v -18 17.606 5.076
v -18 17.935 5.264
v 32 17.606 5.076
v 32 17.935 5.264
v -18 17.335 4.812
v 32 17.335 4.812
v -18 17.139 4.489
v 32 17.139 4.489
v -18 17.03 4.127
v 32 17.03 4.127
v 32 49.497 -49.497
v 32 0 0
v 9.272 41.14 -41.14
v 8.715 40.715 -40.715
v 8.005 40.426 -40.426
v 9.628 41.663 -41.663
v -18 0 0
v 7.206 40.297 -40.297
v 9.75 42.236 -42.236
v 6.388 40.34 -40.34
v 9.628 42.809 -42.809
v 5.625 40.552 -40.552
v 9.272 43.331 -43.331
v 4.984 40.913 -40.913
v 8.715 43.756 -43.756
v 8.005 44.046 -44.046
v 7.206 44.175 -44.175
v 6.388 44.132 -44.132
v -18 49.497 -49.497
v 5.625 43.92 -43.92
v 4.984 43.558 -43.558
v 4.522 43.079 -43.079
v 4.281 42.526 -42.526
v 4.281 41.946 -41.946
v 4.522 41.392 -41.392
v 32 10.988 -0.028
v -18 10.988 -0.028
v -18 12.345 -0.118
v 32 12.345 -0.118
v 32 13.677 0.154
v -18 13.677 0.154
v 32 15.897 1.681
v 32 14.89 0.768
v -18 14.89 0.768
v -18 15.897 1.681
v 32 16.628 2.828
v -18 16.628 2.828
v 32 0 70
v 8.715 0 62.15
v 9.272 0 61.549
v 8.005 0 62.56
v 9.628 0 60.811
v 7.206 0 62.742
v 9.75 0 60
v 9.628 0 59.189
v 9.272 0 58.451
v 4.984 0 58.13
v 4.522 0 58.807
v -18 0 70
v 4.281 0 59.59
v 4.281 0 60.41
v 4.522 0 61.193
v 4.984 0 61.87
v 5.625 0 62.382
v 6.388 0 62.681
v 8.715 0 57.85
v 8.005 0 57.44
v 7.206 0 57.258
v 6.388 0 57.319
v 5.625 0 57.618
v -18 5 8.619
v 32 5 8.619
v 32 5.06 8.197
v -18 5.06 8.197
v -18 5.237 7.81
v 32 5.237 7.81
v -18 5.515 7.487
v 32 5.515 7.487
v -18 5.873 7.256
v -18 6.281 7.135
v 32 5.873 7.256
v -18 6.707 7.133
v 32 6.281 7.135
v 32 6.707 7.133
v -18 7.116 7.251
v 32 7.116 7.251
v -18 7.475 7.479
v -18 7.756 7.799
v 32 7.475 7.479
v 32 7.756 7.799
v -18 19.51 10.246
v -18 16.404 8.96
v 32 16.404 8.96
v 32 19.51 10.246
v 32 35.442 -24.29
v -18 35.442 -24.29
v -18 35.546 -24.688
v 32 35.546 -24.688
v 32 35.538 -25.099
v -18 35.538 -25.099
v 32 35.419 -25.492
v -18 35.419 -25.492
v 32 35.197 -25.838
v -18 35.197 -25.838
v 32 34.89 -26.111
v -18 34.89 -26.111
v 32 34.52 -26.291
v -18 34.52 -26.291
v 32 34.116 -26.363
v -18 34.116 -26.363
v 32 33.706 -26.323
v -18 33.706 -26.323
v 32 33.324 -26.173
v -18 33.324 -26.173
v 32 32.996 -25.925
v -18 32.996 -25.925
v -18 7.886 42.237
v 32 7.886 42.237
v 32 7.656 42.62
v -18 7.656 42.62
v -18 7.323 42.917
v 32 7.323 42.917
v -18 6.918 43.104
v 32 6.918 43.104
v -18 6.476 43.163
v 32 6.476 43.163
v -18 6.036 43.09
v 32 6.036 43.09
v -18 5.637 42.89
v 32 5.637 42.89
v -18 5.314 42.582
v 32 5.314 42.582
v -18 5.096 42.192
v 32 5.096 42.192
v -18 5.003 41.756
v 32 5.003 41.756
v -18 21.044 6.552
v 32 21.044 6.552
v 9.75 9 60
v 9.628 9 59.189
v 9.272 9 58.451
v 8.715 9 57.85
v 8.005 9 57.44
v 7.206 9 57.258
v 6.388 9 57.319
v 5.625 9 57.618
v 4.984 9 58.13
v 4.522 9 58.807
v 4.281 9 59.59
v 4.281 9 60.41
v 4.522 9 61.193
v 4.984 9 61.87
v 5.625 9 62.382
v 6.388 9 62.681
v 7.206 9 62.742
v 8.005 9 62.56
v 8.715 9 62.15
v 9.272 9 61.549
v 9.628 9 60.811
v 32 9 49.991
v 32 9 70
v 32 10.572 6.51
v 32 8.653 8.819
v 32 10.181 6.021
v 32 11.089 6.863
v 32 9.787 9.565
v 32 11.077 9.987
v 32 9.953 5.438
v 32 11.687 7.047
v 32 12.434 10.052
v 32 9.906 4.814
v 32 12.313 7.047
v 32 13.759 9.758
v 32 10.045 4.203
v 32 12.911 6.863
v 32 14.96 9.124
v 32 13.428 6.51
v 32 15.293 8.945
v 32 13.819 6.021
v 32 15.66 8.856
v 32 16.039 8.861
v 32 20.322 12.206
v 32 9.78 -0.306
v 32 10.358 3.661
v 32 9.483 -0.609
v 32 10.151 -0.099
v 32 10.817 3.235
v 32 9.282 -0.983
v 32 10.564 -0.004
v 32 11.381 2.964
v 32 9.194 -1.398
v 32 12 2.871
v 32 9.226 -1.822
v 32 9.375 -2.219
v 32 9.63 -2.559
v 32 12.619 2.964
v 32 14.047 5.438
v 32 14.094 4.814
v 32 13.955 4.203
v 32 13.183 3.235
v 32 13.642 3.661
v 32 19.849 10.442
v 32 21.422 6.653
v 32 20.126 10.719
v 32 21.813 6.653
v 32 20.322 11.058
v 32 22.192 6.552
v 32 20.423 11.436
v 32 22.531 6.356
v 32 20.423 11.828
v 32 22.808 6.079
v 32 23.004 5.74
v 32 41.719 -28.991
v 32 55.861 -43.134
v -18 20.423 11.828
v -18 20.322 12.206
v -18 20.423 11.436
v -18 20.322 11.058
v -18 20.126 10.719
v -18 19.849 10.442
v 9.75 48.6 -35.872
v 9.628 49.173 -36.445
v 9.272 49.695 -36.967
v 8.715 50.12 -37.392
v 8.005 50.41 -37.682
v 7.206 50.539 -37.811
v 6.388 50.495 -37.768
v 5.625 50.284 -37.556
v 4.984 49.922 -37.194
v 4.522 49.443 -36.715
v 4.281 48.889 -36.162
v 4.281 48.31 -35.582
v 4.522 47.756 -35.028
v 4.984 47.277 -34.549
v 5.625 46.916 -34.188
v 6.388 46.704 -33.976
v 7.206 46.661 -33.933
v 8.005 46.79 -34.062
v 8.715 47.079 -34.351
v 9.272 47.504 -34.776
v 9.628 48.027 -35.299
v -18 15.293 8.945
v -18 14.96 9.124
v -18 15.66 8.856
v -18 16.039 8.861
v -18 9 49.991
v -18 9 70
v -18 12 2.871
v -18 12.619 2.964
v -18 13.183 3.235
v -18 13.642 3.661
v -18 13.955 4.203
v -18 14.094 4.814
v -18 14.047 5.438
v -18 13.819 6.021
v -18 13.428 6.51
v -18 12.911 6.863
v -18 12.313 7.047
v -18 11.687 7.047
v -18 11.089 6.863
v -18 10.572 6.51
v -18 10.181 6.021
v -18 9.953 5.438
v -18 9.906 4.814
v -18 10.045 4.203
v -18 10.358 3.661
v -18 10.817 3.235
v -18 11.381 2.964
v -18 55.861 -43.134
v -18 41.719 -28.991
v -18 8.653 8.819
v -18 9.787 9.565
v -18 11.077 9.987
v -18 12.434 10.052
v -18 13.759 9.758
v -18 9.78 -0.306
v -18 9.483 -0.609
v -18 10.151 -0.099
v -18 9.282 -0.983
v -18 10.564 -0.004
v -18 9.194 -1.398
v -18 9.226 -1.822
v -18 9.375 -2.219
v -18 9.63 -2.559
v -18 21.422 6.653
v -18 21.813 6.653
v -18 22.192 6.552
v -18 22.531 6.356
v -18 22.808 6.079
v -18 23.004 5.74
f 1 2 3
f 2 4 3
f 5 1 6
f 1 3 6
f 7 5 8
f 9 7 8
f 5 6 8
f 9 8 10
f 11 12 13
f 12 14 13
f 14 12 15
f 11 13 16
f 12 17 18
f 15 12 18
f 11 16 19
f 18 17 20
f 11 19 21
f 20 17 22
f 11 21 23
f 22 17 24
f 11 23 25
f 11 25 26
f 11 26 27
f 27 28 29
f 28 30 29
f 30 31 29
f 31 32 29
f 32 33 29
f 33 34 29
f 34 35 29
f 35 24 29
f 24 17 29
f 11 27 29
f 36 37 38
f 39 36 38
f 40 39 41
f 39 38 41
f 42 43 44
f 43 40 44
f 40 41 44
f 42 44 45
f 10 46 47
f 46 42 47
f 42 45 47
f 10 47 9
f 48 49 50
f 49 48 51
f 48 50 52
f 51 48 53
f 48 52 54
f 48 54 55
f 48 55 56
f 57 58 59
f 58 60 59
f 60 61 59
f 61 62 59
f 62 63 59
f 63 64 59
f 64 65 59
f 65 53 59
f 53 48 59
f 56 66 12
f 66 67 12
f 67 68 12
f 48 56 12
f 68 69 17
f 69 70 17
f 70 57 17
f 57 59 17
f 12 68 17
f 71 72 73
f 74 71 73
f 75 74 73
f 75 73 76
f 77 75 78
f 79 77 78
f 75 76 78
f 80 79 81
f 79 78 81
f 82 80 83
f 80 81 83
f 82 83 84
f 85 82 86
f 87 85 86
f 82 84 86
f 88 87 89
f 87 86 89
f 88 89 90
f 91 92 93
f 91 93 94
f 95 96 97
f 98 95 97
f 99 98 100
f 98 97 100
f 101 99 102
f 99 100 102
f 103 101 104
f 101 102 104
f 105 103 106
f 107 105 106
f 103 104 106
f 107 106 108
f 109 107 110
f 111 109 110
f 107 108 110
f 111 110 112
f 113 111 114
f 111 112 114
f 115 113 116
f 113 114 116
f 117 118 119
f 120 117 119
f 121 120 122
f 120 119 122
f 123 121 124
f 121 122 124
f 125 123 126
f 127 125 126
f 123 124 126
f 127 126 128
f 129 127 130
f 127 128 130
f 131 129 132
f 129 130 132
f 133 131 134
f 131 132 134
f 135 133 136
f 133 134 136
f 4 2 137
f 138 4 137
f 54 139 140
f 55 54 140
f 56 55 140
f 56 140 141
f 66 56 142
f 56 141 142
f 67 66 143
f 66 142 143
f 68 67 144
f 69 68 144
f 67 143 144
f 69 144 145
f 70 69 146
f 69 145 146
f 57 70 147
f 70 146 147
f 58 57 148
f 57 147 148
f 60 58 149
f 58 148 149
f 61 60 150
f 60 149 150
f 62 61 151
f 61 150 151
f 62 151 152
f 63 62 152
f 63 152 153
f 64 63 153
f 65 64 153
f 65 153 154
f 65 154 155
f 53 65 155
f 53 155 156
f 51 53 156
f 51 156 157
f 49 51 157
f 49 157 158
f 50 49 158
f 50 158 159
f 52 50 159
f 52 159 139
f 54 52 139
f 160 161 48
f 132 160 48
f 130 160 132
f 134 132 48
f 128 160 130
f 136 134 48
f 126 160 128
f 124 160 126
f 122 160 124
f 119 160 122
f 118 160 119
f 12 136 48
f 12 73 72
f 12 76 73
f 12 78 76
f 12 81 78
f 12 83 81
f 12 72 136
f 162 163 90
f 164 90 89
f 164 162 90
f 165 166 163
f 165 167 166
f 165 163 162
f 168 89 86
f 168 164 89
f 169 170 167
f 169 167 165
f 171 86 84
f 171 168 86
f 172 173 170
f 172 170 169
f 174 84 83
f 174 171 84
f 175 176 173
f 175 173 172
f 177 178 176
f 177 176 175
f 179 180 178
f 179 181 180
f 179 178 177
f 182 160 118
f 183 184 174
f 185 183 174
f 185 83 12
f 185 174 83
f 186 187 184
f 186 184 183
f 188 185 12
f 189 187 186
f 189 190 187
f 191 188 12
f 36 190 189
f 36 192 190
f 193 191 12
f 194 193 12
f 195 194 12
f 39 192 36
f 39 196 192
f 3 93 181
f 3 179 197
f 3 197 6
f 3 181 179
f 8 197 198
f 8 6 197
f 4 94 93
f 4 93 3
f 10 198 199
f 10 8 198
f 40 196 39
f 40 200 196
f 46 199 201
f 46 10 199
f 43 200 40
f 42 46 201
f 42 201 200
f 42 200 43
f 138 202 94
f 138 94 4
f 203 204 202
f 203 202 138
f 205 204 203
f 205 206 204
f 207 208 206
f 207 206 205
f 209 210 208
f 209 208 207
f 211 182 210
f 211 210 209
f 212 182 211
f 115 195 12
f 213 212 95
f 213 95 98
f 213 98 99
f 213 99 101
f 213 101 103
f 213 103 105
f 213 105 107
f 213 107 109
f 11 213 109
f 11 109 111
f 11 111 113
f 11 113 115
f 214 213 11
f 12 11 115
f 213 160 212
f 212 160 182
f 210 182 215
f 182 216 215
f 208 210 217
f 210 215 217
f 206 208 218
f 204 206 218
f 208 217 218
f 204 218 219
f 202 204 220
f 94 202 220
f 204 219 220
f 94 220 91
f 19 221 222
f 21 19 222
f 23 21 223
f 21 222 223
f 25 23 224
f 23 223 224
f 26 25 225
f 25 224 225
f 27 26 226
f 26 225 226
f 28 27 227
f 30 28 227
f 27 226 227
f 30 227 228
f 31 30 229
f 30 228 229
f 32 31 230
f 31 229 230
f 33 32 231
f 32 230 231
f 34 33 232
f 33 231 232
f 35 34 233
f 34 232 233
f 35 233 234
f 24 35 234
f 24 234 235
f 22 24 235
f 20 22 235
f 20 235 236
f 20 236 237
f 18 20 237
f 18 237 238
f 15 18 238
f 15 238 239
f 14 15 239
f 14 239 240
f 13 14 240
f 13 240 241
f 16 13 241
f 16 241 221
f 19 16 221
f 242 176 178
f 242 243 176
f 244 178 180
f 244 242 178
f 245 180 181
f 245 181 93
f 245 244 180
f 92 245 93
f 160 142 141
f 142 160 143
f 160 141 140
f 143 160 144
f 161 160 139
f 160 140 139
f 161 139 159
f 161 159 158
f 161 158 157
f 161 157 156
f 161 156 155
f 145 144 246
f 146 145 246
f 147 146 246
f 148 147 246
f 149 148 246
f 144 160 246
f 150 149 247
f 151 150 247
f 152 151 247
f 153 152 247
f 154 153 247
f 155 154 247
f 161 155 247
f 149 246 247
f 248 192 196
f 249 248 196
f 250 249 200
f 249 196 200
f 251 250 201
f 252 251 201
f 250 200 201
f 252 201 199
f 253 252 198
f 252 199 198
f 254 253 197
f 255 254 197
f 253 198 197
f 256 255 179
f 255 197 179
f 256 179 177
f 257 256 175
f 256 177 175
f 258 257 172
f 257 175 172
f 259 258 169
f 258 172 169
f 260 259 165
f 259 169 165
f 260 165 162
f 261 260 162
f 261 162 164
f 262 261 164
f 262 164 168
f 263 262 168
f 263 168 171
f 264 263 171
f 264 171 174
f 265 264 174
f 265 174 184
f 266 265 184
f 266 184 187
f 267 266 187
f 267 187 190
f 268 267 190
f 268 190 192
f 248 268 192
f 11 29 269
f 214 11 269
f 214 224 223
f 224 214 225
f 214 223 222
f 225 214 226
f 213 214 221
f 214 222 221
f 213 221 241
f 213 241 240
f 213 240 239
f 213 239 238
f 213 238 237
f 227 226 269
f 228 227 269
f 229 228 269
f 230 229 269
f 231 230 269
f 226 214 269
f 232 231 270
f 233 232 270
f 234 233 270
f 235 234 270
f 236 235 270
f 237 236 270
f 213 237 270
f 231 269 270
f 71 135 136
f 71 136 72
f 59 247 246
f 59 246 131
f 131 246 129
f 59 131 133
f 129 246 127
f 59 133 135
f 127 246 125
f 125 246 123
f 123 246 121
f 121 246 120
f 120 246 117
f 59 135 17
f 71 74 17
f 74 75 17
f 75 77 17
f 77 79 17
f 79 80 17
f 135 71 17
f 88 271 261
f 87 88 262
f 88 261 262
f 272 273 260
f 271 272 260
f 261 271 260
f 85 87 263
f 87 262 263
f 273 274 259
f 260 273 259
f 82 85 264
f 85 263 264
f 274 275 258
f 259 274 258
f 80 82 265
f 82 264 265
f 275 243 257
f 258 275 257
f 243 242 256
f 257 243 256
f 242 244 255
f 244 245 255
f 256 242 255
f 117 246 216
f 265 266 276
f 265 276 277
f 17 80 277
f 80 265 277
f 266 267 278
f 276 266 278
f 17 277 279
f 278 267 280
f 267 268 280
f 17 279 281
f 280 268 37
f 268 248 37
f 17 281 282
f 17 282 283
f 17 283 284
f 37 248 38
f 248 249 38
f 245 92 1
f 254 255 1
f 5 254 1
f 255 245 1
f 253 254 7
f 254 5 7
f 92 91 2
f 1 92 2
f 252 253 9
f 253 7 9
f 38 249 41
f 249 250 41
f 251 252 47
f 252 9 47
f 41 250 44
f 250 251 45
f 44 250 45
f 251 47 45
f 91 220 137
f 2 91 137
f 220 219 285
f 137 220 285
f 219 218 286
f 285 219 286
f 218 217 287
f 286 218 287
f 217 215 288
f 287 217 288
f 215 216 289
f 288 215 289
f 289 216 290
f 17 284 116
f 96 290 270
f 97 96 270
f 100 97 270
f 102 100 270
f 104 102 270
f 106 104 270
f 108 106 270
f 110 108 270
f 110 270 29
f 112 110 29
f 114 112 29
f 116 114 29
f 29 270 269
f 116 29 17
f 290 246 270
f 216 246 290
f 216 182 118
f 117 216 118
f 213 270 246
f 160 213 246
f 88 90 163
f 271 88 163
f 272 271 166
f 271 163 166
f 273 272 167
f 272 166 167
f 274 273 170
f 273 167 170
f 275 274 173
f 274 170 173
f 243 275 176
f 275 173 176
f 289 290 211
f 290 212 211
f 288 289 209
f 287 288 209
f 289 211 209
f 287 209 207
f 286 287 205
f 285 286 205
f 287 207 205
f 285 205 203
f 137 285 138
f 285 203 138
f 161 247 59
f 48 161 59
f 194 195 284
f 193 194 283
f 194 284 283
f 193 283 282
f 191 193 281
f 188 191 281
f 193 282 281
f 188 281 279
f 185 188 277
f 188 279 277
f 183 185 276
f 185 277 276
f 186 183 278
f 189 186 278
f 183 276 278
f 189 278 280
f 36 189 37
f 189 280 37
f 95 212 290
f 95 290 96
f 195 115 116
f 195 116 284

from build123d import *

# Parameters (mm, degrees)
BOSS_EXTRUDE1_DEPTH            = 25
BOSS_EXTRUDE1_DEPTH_BACK       = 25
CUT_EXTRUDE1_DEPTH             = 103.569488641
CUT_EXTRUDE2_DEPTH             = 103.569488641
F_5_5_5_5_DIAMETER_HOLE1_D     = 5.5
F_5_5_5_5_DIAMETER_HOLE1_DEPTH = 88.997474683
F_5_5_5_5_DIAMETER_HOLE2_D     = 5.5
F_5_5_5_5_DIAMETER_HOLE2_DEPTH = 55.861435714
F_4_2_4_2_DIAMETER_HOLE1_D     = 4.2
FILLET1_R                      = 1.5


with BuildPart() as part:
    # Sketch1 → Boss-Extrude1 (new, two sides: drawn at the far end of the back side and taken through both)
    with BuildSketch(Plane(origin=(7, 0, 0), x_dir=(0, 0, -1), z_dir=(1, 0, 0)).offset(-BOSS_EXTRUDE1_DEPTH_BACK)):
        Polygon((-70, 9), (-70, 0), (0, 0), (49.497474683, 49.497474683), (43.133513652, 55.861435714), (28.991378029, 41.71930009), (-49.991379635, 9), align=None)
    extrude(amount=BOSS_EXTRUDE1_DEPTH + BOSS_EXTRUDE1_DEPTH_BACK)

    # Sketch2 → Cut-Extrude1 (cut, through all)
    with BuildSketch(Plane(origin=(32, 0, 0), x_dir=(0, 0, -1), z_dir=(1, 0, 0))):
        with BuildLine():
            Line((-41.755939666, 5.002860881), (-8.618926871, 5.000000007))
            ThreePointArc((-8.618926871, 5.000000007), (-7.181014363, 6.072472193), (-7.79931621, 7.756364053))
            ThreePointArc((-7.79931621, 7.756364053), (-10.043251633, 11.471008803), (-8.614205769, 15.568771574))
            Line((-8.614205769, 15.568771574), (-10.820032984, 20.895618515))
            Line((-10.820032984, 20.895618515), (-42.237227621, 7.885876783))
            ThreePointArc((-42.237227621, 7.885876783), (-43.142866756, 6.253009411), (-41.755939666, 5.002860881))
        make_face()
    extrude(amount=-CUT_EXTRUDE1_DEPTH, mode=Mode.SUBTRACT)

    # Sketch3 → Cut-Extrude2 (cut, through all)
    with BuildSketch(Plane.ZY.offset(18)):
        with BuildLine():
            Line((-25.924897249, 32.995965061), (-2.558913388, 9.6299812))
            ThreePointArc((-2.558913388, 9.6299812), (-0.788934633, 9.368950353), (-0.028067769, 10.988222878))
            ThreePointArc((-0.028067769, 10.988222878), (1.006237273, 15.208445656), (4.918155981, 17.099730731))
            Line((4.918155981, 17.099730731), (7.125818191, 22.42949878))
            Line((7.125818191, 22.42949878), (-24.290211928, 35.442444531))
            ThreePointArc((-24.290211928, 35.442444531), (-26.111441495, 34.889980582), (-25.924897249, 32.995965061))
        make_face()
    extrude(amount=-CUT_EXTRUDE2_DEPTH, mode=Mode.SUBTRACT)

    # Ø5.5 (5.5) Diameter Hole1
    with Locations(Plane(origin=(0, 0, 0), x_dir=(-1, 0, 0), z_dir=(0, -0.7071067811865477, -0.7071067811865475))):
        with Locations((-7, 59.730322699)):
            Hole(F_5_5_5_5_DIAMETER_HOLE1_D / 2, depth=F_5_5_5_5_DIAMETER_HOLE1_DEPTH)

    # Ø5.5 (5.5) Diameter Hole2
    with Locations(Plane(origin=(0, 0, 0), x_dir=(-1, 0, 0), z_dir=(0, -1, 0))):
        with Locations((-7, -60)):
            Hole(F_5_5_5_5_DIAMETER_HOLE2_D / 2, depth=F_5_5_5_5_DIAMETER_HOLE2_DEPTH)

    # Ø4.2 (4.2) Diameter Hole1 (through all)
    with Locations(Plane.ZY.offset(18)):
        with Locations((4.970562748, 12)):
            Hole(F_4_2_4_2_DIAMETER_HOLE1_D / 2)

    # Fillet1
    fillet1_edges = [part.edges().sort_by_distance(p)[0] for p in [
        (7, 20.895618515, 10.820032984),
        (7, 15.568771574, 8.614205769),
        (7, 22.42949878, 7.125818191),
        (7, 17.099730731, 4.918155981),
    ]]
    fillet(fillet1_edges, radius=FILLET1_R)


solid = part.part
